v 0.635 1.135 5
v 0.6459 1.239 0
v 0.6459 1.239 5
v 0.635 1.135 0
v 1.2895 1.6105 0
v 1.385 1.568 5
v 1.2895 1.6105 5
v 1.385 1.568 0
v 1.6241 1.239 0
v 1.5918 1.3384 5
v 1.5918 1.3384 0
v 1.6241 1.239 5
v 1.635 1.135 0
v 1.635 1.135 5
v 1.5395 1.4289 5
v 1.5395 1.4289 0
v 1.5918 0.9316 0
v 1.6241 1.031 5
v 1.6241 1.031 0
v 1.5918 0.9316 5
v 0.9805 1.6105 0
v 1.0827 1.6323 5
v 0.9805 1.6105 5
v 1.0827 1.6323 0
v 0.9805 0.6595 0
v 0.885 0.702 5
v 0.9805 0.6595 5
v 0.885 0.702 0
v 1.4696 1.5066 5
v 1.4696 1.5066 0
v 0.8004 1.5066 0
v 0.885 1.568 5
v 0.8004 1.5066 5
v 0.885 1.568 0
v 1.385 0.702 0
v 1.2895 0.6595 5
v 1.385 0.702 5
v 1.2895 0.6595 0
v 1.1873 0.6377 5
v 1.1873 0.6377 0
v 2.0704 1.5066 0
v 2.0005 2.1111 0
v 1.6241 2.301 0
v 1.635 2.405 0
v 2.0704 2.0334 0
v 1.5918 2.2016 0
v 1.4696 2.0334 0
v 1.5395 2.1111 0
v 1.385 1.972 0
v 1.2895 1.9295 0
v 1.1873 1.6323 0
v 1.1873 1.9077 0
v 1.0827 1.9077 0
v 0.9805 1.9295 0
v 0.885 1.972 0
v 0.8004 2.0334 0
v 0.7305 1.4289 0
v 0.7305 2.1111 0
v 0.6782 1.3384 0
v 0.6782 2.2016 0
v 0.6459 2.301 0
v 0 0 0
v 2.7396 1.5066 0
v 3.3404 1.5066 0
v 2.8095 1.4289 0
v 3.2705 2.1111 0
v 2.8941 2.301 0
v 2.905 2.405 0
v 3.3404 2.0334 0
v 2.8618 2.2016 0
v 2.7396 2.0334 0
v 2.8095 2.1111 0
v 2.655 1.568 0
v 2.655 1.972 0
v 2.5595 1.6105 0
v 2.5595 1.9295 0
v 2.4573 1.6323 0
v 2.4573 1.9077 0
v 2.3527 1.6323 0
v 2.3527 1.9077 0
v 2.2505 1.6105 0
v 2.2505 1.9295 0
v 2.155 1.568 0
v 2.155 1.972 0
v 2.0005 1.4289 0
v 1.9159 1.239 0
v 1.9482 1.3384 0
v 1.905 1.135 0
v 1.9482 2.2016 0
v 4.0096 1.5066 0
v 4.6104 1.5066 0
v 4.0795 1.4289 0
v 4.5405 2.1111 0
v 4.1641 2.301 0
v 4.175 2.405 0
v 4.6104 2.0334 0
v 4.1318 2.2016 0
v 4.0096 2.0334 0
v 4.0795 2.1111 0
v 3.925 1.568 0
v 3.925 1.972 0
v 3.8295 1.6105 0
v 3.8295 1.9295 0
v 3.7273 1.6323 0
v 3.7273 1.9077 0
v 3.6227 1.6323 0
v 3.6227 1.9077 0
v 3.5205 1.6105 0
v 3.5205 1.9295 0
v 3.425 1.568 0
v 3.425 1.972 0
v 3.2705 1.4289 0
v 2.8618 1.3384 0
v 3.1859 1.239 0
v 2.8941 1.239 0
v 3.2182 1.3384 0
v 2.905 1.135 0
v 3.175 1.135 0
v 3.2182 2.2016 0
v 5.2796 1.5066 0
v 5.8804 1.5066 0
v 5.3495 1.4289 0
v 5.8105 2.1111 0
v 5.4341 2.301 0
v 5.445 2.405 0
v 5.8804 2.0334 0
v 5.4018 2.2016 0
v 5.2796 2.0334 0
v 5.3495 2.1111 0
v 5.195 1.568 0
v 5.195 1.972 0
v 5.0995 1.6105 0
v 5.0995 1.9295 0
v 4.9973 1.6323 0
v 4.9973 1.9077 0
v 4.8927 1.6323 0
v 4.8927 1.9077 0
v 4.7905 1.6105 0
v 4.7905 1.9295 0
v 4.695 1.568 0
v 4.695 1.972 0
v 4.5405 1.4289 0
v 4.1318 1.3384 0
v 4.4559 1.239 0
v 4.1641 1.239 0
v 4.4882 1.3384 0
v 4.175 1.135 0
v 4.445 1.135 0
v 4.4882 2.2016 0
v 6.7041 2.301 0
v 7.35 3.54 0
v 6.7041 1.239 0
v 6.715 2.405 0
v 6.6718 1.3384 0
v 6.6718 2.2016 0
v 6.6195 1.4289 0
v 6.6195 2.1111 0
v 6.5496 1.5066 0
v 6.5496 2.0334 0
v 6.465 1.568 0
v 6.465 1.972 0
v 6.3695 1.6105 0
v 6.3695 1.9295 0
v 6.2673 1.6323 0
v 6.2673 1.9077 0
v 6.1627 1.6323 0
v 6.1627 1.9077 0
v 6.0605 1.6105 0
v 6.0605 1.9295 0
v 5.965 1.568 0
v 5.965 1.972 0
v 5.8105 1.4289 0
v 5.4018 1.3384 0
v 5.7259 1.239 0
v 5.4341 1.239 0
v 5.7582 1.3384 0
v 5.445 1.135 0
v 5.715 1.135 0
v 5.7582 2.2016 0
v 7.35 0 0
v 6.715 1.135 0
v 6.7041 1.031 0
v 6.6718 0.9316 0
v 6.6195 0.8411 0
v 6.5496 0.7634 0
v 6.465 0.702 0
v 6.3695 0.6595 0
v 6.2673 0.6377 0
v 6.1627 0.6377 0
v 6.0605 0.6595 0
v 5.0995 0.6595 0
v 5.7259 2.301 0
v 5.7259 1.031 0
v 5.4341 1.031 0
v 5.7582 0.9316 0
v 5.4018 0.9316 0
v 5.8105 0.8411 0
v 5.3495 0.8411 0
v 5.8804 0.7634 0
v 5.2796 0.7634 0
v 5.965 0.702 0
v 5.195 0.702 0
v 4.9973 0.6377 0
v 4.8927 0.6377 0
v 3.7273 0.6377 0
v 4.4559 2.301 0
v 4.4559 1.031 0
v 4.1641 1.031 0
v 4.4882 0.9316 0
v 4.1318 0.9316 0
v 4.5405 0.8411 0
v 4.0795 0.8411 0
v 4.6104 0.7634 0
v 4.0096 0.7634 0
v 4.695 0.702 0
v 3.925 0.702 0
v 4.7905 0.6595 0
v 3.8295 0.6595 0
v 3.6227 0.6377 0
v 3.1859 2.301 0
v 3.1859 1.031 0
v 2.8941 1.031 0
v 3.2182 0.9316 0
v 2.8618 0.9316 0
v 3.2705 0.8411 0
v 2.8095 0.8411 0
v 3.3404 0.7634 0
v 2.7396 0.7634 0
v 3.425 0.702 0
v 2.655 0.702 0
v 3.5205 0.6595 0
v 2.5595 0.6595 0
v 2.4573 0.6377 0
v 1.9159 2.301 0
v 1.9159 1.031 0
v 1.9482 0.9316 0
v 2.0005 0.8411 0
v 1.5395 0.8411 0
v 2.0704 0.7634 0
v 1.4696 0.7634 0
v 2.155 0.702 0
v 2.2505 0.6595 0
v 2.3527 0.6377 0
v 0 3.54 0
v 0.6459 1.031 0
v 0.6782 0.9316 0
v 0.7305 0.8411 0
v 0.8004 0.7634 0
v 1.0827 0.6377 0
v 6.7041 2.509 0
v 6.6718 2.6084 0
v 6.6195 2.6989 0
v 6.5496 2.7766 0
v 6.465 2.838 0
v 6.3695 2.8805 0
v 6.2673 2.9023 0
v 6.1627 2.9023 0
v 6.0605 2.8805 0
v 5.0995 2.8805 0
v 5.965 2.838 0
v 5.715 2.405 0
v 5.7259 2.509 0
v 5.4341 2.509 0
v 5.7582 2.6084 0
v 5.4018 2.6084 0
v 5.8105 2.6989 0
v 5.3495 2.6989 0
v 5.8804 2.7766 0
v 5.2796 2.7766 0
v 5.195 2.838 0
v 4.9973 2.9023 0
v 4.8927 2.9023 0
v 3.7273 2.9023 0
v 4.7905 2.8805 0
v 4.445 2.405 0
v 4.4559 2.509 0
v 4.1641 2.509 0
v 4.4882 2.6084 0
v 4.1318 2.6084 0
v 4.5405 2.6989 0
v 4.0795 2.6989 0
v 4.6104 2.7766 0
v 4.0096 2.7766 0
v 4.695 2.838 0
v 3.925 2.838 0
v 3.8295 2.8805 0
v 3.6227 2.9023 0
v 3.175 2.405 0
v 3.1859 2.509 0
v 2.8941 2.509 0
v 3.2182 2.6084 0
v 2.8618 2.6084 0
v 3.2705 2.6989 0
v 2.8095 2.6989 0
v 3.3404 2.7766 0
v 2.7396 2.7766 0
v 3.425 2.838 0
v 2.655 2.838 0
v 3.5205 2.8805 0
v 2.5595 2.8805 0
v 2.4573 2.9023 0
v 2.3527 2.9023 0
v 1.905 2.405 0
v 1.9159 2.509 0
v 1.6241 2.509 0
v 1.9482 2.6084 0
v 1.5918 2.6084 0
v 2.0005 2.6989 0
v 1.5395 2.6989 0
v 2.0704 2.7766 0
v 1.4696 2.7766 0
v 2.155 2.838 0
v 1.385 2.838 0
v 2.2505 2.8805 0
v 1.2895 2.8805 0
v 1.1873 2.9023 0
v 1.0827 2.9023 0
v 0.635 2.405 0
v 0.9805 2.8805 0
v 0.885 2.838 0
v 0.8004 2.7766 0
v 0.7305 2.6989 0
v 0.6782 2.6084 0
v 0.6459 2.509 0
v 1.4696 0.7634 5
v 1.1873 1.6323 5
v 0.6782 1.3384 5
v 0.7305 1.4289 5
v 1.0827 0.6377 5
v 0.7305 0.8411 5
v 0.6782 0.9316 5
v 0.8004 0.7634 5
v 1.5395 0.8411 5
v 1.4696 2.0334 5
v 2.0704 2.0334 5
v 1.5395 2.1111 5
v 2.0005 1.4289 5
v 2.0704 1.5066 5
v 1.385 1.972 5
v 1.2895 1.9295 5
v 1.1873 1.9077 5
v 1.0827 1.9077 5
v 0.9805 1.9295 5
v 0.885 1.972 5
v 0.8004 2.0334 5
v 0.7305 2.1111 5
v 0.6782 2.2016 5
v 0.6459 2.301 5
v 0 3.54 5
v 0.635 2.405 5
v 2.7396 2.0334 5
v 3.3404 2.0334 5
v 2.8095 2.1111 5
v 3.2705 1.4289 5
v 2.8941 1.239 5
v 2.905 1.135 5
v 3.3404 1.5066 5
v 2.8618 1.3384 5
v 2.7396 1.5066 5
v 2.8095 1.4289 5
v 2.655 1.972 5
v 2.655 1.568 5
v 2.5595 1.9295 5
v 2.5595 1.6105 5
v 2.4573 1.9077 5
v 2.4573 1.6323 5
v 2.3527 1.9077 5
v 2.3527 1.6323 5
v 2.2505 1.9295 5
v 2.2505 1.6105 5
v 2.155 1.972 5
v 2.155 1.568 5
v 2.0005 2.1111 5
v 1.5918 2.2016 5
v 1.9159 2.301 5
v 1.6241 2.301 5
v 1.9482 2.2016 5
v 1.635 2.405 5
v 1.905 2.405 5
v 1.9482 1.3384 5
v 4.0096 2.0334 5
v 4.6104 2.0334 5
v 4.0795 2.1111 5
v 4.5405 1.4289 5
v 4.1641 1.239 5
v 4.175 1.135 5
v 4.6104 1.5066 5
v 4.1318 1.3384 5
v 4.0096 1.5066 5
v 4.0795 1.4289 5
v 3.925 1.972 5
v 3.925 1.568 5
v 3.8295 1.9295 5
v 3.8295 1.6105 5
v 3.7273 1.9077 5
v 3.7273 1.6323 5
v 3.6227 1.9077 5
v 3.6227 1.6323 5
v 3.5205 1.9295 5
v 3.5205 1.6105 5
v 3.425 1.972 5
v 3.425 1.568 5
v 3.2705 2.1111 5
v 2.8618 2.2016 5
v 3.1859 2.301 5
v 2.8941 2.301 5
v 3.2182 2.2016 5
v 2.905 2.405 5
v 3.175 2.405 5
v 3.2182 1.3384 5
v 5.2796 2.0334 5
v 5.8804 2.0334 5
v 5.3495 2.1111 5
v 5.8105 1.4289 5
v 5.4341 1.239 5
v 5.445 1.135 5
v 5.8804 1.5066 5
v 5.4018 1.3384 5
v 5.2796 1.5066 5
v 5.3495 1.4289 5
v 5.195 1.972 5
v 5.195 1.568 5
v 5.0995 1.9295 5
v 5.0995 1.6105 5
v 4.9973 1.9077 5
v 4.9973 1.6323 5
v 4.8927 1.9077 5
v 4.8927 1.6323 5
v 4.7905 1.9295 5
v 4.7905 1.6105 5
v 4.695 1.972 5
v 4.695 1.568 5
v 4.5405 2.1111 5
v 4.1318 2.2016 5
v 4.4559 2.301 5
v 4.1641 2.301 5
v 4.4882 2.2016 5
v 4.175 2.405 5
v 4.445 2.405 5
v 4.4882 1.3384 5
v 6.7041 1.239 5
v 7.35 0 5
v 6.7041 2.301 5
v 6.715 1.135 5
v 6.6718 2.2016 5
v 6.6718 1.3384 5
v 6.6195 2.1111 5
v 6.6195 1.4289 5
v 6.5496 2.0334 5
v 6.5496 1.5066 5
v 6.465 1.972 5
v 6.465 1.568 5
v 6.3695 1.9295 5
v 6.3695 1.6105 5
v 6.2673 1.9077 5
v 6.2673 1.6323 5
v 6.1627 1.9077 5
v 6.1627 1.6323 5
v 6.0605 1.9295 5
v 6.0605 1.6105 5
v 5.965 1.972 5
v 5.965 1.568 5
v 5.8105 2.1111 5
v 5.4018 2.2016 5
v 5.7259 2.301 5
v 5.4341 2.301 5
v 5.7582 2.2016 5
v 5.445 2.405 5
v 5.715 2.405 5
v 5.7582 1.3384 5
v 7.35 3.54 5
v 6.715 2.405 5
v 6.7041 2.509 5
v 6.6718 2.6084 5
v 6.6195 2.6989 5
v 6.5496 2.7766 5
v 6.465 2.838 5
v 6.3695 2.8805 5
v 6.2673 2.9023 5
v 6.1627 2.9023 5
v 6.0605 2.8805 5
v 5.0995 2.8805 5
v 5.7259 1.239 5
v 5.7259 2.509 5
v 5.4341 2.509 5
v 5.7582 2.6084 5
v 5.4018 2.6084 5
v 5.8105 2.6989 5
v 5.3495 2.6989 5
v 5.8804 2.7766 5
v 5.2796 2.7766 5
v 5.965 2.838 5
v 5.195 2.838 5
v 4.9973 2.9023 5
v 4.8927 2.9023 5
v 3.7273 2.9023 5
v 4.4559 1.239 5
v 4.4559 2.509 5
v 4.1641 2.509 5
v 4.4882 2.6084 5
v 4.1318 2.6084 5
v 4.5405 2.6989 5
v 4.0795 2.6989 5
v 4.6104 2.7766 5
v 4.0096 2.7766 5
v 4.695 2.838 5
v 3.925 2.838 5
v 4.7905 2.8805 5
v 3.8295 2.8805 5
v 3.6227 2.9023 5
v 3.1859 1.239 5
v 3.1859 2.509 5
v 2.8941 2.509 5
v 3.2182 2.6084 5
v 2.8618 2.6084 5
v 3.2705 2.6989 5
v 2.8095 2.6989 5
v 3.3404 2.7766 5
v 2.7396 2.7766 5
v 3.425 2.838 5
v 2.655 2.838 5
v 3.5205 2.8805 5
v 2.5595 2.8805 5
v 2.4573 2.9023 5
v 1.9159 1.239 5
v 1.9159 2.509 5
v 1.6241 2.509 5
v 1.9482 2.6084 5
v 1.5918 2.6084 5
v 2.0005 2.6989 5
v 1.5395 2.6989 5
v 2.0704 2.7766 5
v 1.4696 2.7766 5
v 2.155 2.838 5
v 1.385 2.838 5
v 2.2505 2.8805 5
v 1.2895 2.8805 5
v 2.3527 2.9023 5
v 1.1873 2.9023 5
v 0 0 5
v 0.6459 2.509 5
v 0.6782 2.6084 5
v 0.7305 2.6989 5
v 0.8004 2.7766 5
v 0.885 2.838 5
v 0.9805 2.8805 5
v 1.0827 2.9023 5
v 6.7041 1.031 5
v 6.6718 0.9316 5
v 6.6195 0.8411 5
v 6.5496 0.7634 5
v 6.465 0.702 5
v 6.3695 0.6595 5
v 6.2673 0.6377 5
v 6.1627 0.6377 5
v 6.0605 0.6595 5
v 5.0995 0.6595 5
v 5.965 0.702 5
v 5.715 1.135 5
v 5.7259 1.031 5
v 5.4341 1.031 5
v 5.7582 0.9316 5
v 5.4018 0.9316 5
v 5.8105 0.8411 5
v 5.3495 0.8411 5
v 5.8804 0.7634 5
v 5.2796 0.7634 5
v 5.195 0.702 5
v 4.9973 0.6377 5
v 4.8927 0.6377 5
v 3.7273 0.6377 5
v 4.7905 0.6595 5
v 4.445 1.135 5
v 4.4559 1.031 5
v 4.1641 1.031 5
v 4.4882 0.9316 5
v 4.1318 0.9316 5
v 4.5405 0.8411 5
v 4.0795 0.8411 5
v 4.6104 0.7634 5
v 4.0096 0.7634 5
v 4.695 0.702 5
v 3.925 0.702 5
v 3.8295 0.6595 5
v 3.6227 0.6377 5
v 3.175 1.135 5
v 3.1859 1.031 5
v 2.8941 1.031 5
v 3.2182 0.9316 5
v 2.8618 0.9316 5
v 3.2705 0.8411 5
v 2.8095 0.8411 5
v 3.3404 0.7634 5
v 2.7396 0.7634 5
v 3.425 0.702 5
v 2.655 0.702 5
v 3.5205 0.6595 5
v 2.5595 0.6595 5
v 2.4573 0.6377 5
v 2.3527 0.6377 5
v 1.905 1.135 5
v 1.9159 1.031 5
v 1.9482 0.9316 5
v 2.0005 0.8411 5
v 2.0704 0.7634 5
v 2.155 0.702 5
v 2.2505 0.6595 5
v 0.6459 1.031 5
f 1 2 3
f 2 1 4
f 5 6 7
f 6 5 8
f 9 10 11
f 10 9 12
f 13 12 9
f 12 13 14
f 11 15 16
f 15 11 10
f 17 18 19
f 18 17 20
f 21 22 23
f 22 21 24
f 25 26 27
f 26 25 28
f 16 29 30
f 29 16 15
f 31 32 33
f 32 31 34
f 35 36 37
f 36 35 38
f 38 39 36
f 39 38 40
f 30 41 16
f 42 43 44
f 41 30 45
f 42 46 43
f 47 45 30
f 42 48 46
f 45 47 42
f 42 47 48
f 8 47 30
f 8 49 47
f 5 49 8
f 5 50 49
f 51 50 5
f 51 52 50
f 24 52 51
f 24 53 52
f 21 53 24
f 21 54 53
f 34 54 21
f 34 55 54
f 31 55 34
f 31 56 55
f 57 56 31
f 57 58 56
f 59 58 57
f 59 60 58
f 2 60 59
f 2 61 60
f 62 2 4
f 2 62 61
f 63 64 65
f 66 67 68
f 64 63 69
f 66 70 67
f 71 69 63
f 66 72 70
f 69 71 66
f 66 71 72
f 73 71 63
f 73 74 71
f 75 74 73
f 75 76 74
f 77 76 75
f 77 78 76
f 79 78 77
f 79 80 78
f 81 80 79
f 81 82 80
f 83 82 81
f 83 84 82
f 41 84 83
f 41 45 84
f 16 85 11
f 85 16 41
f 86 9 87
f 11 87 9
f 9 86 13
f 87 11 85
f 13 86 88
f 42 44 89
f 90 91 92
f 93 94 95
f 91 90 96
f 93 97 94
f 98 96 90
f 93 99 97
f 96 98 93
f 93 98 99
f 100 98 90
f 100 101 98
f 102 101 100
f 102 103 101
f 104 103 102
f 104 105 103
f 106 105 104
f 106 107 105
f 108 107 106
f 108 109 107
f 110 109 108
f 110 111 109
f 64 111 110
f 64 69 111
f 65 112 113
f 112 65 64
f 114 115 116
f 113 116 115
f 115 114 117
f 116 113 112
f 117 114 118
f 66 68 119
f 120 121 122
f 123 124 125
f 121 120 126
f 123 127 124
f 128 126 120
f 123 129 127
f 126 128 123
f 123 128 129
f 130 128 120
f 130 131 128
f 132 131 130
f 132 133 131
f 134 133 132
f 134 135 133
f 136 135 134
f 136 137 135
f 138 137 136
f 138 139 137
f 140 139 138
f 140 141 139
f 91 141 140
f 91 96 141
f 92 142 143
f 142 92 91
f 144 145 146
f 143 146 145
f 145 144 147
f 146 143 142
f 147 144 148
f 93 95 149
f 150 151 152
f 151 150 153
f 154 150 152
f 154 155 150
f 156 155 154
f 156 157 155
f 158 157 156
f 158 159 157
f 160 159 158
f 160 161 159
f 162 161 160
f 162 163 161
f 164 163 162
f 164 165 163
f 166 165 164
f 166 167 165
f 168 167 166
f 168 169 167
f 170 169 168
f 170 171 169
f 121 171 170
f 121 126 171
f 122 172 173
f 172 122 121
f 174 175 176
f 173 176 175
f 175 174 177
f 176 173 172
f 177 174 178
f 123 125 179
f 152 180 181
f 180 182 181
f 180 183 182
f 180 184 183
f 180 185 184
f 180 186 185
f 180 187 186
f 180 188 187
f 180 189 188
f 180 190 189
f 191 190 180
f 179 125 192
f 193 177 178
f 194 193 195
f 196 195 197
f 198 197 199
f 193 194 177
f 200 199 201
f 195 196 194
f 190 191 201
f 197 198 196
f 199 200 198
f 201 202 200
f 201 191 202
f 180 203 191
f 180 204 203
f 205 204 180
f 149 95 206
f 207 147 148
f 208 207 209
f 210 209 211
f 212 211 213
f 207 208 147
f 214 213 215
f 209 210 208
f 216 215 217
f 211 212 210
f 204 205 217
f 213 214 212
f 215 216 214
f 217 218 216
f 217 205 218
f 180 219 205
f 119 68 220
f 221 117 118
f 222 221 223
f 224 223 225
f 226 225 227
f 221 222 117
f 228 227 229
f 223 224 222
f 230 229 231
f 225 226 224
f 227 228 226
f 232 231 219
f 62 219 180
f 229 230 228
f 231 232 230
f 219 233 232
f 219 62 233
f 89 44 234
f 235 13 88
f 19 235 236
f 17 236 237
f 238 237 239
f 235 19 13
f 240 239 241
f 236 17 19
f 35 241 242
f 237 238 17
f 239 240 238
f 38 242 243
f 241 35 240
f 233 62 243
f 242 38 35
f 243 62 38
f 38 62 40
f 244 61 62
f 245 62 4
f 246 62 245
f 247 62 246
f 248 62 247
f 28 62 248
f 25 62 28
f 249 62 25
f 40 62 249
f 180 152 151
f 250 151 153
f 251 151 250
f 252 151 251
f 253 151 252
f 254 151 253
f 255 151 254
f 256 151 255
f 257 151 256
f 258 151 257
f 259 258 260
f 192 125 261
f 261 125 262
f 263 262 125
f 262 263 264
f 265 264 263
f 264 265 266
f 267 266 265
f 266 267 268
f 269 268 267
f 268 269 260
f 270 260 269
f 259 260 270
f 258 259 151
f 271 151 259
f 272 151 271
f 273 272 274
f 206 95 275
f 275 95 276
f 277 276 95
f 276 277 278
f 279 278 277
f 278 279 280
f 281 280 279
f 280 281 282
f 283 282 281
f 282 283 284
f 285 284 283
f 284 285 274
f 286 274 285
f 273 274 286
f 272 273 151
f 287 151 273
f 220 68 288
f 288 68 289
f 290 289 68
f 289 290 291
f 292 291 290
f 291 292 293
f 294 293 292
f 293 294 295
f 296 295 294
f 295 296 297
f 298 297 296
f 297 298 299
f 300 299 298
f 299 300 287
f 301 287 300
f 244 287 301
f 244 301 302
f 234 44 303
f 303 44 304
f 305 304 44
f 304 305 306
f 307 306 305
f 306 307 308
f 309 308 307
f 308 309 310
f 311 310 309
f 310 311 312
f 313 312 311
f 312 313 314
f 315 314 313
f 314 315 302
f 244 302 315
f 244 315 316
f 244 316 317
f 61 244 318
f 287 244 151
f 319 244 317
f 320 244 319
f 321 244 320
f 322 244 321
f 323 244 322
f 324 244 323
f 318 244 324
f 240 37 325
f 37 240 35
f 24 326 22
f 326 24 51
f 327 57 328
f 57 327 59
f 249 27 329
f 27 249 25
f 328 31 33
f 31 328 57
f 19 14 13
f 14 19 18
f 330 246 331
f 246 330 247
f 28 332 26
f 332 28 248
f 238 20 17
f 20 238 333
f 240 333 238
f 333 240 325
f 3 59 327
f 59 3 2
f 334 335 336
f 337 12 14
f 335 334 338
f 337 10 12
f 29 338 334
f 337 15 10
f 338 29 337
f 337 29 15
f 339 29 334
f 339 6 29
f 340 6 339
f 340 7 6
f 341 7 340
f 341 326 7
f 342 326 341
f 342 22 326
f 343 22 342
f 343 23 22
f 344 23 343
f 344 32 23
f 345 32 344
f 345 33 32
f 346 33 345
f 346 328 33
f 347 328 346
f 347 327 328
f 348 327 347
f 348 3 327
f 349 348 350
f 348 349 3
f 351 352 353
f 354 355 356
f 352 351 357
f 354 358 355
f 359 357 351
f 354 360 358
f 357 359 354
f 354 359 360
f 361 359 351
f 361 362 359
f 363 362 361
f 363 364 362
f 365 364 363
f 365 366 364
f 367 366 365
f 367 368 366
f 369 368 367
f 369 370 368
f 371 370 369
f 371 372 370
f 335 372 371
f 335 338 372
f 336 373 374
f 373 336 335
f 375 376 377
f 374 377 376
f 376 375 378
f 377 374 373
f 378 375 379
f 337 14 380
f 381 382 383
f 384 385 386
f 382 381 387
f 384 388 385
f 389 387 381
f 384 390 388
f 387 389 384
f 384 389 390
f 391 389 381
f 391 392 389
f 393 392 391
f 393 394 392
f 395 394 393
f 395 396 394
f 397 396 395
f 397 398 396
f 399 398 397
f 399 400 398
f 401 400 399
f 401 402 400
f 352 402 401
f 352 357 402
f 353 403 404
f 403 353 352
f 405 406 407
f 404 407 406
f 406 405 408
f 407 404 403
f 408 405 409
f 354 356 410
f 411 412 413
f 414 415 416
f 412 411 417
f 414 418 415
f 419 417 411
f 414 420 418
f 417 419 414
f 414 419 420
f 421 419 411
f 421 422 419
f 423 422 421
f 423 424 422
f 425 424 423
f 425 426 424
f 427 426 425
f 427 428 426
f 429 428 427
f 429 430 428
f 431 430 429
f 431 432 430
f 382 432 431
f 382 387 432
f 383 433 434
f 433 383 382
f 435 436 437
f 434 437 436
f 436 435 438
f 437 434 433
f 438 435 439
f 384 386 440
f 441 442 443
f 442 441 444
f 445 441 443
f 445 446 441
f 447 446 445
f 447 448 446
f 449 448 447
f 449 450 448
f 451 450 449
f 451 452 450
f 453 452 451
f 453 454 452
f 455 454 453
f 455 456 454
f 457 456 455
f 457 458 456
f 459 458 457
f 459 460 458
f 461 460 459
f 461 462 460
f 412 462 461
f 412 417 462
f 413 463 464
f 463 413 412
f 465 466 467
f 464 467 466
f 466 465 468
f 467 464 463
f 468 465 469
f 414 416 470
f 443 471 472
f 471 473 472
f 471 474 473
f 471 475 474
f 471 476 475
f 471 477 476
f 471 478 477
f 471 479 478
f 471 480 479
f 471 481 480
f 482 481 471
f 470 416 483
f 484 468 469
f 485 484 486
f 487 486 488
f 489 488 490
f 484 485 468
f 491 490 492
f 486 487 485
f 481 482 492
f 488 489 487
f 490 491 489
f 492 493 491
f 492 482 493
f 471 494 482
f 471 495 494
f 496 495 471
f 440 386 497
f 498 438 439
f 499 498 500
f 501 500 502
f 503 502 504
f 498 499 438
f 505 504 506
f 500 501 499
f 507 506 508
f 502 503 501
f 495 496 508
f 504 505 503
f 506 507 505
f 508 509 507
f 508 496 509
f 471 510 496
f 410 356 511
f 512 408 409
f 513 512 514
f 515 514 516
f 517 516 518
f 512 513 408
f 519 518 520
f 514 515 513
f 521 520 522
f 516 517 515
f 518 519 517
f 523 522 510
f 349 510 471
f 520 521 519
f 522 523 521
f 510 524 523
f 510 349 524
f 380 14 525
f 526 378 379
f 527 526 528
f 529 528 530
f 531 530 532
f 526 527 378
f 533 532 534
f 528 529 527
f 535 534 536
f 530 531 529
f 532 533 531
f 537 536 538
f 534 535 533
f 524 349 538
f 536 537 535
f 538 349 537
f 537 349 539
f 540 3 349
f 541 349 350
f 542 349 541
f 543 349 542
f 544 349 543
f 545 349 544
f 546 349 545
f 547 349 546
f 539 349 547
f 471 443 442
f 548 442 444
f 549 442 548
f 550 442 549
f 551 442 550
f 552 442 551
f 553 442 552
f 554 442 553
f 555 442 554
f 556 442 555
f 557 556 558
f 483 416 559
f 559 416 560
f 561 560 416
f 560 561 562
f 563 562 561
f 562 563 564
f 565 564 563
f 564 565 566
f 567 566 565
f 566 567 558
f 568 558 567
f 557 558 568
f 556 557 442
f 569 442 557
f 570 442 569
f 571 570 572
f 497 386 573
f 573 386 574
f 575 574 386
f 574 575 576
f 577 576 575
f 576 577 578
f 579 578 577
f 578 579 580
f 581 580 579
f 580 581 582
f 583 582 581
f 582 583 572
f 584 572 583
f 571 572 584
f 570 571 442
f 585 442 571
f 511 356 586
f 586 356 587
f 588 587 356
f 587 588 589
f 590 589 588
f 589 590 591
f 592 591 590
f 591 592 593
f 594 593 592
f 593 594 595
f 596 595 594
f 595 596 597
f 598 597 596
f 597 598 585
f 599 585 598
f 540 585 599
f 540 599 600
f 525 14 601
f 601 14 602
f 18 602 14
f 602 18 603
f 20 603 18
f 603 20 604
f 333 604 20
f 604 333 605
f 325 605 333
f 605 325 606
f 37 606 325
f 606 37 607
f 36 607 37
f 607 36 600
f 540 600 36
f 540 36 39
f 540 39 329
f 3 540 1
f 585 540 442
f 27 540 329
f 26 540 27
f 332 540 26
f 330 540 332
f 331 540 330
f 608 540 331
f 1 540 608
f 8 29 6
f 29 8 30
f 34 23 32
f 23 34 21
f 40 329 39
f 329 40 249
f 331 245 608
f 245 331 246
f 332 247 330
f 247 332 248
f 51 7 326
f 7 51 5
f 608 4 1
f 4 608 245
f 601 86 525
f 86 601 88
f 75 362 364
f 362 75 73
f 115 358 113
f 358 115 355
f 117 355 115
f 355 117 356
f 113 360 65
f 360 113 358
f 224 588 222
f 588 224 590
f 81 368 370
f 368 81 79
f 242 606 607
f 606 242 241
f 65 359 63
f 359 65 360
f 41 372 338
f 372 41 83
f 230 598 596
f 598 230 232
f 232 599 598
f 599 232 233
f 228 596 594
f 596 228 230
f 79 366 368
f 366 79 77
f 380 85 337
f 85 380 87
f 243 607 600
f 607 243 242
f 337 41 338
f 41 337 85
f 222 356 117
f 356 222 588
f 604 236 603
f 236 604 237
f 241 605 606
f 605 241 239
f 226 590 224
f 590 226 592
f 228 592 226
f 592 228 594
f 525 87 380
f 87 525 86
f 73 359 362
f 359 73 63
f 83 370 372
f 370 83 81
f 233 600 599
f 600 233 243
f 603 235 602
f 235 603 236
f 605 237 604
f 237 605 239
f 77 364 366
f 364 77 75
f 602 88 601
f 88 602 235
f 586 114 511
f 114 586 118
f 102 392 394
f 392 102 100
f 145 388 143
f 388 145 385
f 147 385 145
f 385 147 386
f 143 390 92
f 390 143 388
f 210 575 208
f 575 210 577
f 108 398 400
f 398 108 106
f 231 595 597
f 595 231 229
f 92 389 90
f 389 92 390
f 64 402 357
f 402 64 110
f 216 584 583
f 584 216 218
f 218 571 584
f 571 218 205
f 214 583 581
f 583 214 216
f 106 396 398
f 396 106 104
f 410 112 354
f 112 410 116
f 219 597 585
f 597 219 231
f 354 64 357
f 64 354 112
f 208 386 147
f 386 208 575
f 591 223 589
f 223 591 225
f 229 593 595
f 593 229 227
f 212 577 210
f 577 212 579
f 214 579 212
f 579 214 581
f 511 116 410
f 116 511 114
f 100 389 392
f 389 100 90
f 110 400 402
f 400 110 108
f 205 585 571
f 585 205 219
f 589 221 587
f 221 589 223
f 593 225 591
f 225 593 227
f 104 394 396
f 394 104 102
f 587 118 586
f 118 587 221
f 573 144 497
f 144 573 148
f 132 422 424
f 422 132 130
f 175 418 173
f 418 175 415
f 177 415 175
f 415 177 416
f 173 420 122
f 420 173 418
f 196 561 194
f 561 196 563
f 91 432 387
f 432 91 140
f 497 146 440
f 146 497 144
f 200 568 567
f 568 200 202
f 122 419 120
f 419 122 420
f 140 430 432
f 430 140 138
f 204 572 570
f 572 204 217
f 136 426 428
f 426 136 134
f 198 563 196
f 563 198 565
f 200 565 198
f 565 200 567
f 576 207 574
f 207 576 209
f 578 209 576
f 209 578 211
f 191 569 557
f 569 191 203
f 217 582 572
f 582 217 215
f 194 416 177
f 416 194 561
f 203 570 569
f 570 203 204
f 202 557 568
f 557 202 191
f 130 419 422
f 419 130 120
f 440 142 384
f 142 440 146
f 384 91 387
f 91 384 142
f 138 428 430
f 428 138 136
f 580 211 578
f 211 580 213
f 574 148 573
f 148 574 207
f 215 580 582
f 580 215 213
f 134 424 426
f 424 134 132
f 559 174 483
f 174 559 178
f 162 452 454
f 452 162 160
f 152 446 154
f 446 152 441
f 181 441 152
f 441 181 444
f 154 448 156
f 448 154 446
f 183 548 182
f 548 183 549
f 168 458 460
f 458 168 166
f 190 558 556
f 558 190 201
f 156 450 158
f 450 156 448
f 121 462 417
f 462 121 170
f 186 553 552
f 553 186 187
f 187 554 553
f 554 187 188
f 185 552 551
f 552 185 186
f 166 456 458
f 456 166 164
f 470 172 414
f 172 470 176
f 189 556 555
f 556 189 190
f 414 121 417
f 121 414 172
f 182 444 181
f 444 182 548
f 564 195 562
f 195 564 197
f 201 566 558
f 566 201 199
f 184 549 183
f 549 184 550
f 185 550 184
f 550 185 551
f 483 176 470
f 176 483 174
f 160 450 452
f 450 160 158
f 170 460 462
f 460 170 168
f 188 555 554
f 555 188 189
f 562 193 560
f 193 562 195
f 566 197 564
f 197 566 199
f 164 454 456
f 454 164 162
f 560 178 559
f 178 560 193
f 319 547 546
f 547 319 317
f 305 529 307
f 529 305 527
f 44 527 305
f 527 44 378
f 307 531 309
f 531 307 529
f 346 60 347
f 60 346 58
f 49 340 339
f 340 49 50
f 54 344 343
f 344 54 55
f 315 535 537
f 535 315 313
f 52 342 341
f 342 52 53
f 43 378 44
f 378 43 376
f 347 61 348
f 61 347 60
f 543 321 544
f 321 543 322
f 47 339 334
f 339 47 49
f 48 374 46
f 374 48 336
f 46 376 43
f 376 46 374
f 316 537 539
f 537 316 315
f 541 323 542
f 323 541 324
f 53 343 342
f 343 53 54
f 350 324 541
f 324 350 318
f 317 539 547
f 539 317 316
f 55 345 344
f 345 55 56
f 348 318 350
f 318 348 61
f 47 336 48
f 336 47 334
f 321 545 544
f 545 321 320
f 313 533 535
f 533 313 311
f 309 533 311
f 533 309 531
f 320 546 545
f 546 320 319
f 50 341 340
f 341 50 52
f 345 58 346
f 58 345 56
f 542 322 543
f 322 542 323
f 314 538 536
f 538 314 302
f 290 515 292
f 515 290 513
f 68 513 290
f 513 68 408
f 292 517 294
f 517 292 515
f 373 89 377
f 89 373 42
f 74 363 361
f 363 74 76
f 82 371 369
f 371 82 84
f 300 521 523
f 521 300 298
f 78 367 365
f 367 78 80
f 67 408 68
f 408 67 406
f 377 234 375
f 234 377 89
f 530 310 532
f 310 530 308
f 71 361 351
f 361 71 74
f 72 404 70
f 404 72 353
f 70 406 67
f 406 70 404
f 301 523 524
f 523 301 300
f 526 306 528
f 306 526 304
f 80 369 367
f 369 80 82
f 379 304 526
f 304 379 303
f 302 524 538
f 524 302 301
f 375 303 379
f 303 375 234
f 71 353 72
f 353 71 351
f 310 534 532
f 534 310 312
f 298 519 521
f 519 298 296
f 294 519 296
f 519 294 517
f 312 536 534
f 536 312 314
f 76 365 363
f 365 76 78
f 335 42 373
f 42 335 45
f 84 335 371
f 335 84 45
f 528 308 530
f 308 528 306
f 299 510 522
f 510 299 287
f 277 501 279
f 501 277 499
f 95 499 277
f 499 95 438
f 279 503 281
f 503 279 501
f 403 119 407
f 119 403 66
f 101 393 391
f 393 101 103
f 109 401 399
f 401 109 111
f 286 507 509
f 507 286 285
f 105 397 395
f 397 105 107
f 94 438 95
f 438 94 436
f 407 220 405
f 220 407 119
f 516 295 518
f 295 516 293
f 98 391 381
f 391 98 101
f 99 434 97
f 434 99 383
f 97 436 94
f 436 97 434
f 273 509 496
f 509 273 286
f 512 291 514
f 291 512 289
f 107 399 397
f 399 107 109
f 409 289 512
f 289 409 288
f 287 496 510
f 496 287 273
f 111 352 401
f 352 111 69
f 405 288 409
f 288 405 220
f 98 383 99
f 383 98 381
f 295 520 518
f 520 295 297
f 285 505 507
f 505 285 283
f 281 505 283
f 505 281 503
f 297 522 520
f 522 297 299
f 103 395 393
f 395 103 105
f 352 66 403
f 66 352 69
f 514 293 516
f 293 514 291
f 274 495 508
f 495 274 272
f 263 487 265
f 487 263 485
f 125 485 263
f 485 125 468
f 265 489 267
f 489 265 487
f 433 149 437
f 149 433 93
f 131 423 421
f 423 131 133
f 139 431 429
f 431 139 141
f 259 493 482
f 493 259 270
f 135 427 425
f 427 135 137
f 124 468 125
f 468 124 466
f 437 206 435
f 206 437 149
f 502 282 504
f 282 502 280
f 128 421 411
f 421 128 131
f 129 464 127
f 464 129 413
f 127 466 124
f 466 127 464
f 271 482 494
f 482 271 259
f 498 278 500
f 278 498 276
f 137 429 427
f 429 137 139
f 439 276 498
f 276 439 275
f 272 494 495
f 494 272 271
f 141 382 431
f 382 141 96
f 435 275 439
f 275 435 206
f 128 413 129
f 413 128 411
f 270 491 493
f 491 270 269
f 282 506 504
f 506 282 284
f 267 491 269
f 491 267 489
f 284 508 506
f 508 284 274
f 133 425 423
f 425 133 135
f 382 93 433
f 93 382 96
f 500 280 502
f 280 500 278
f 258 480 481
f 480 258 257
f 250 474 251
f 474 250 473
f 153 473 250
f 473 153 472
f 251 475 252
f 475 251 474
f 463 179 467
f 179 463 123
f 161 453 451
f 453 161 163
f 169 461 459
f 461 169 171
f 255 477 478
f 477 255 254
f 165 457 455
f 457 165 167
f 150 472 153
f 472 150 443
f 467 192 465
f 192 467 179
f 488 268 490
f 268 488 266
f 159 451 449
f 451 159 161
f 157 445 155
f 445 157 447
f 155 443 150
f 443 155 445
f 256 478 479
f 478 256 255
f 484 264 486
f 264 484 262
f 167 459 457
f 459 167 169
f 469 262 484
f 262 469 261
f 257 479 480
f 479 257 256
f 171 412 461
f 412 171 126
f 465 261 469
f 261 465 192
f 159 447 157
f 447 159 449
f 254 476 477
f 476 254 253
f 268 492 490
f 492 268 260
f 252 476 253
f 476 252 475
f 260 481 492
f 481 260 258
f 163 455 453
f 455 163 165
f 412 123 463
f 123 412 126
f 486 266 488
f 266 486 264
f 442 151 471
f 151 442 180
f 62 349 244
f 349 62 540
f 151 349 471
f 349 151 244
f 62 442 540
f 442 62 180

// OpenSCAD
/*
 * OpenSCAD Pogo Pin Rendering Tool (PPRT)
 *
 * Copyright (2019) Brian 'redbeard' Harrington, <redbeard@dead-city.org>
 *
 * PPRT is free software: you can redistribute it and/or modify
 * it under the terms of the GNU Affero General Public License as published by
 * the Free Software Foundation, either version 3 of the License, or
 * (at your option) any later version.
 *
 * PPRT is distributed in the hope that it will be useful,
 * but WITHOUT ANY WARRANTY; without even the implied warranty of
 * MERCHANTABILITY or FITNESS FOR A PARTICULAR PURPOSE.  See the
 * GNU Affero General Public License for more details.
 *
 * You should have received a copy of the GNU Affero General Public License
 * along with PPRT.  If not, see <https://www.gnu.org/licenses/>.
 */

// These options can be overridden when calling "make", e.g.:
// make svg 

// Block size (if using, set AUTOSIZE=false)
LENGTH = 1;
WIDTH = 1;
HEIGHT = 5;

IS_CENTERED = true;
OFFSET_X = 0;
OFFSET_Y = 0;

// Pin definitions
PIN_DIAMETER = 1;
PITCH = 1.27;
ROWS = 2;
COLS = 5;


assert (PIN_DIAMETER < PITCH, 
  "Your PIN_DIAMETER is larger than your pin PITCH.");

// Global configurations, these shouldn't need to be changed
2D=false;
AUTOSIZE=true;
debug = true;


// helpers
pin_block_length = PITCH * COLS;
pin_block_width = PITCH * ROWS;


render_length = (AUTOSIZE && (LENGTH < pin_block_length)) ? pin_block_length + 1 : LENGTH;
render_width = (AUTOSIZE && (WIDTH < pin_block_width)) ? pin_block_width + 1 : WIDTH;
render_height = HEIGHT;

// check if pin block should be "centered"
vx = (IS_CENTERED) ? (render_length - pin_block_length) / 2 : 0;
vy = (IS_CENTERED) ? (render_width - pin_block_width) / 2 : 0;


// print calculations to the console if needed
if (debug) {
  echo("pin_block_length: ", pin_block_length);
  echo("pin_block_width: ", pin_block_width);
  echo("Pinblock start X: ", vx);
  echo("Pinblock start Y: ", vy);
  echo("render_length: ", render_length);
  echo("render_width: ", render_width);
  echo("render_height: ", render_height);
}

module gen_pinblock(rows=ROWS, cols=COLS) {
  assert(rows > 0, "ROWS must be greater than 0"); 
  assert(cols > 0, "COLS must be greater than 0"); 
  for (row = [1:rows]) {
    for (col = [1:cols]) {  
          translate ([(col* PITCH) - PITCH/2, (row* PITCH) - PITCH/2, 0])
          cylinder(h=HEIGHT, d=PIN_DIAMETER, $fn=30);
    };
  }
}

/*
 create the rectangle as frame, then execute a loop to generate the
 pin structure and remove the pin material

 note, the cut=2D specifies if this should be a two dimensional slice versus
 a three dimensional render.
*/
if (2D) {
  projection(cut=true)
  difference(){
    cube([render_length,render_width,render_height]);
    translate ([vx + OFFSET_X,vy + OFFSET_Y,0])
    gen_pinblock();
  }
} else {
  difference(){
    cube([render_length,render_width,render_height]);
    translate ([vx + OFFSET_X,vy + OFFSET_Y,0])
    gen_pinblock();
  }
}

// vim: ts=2 sw=2 et tw=80
